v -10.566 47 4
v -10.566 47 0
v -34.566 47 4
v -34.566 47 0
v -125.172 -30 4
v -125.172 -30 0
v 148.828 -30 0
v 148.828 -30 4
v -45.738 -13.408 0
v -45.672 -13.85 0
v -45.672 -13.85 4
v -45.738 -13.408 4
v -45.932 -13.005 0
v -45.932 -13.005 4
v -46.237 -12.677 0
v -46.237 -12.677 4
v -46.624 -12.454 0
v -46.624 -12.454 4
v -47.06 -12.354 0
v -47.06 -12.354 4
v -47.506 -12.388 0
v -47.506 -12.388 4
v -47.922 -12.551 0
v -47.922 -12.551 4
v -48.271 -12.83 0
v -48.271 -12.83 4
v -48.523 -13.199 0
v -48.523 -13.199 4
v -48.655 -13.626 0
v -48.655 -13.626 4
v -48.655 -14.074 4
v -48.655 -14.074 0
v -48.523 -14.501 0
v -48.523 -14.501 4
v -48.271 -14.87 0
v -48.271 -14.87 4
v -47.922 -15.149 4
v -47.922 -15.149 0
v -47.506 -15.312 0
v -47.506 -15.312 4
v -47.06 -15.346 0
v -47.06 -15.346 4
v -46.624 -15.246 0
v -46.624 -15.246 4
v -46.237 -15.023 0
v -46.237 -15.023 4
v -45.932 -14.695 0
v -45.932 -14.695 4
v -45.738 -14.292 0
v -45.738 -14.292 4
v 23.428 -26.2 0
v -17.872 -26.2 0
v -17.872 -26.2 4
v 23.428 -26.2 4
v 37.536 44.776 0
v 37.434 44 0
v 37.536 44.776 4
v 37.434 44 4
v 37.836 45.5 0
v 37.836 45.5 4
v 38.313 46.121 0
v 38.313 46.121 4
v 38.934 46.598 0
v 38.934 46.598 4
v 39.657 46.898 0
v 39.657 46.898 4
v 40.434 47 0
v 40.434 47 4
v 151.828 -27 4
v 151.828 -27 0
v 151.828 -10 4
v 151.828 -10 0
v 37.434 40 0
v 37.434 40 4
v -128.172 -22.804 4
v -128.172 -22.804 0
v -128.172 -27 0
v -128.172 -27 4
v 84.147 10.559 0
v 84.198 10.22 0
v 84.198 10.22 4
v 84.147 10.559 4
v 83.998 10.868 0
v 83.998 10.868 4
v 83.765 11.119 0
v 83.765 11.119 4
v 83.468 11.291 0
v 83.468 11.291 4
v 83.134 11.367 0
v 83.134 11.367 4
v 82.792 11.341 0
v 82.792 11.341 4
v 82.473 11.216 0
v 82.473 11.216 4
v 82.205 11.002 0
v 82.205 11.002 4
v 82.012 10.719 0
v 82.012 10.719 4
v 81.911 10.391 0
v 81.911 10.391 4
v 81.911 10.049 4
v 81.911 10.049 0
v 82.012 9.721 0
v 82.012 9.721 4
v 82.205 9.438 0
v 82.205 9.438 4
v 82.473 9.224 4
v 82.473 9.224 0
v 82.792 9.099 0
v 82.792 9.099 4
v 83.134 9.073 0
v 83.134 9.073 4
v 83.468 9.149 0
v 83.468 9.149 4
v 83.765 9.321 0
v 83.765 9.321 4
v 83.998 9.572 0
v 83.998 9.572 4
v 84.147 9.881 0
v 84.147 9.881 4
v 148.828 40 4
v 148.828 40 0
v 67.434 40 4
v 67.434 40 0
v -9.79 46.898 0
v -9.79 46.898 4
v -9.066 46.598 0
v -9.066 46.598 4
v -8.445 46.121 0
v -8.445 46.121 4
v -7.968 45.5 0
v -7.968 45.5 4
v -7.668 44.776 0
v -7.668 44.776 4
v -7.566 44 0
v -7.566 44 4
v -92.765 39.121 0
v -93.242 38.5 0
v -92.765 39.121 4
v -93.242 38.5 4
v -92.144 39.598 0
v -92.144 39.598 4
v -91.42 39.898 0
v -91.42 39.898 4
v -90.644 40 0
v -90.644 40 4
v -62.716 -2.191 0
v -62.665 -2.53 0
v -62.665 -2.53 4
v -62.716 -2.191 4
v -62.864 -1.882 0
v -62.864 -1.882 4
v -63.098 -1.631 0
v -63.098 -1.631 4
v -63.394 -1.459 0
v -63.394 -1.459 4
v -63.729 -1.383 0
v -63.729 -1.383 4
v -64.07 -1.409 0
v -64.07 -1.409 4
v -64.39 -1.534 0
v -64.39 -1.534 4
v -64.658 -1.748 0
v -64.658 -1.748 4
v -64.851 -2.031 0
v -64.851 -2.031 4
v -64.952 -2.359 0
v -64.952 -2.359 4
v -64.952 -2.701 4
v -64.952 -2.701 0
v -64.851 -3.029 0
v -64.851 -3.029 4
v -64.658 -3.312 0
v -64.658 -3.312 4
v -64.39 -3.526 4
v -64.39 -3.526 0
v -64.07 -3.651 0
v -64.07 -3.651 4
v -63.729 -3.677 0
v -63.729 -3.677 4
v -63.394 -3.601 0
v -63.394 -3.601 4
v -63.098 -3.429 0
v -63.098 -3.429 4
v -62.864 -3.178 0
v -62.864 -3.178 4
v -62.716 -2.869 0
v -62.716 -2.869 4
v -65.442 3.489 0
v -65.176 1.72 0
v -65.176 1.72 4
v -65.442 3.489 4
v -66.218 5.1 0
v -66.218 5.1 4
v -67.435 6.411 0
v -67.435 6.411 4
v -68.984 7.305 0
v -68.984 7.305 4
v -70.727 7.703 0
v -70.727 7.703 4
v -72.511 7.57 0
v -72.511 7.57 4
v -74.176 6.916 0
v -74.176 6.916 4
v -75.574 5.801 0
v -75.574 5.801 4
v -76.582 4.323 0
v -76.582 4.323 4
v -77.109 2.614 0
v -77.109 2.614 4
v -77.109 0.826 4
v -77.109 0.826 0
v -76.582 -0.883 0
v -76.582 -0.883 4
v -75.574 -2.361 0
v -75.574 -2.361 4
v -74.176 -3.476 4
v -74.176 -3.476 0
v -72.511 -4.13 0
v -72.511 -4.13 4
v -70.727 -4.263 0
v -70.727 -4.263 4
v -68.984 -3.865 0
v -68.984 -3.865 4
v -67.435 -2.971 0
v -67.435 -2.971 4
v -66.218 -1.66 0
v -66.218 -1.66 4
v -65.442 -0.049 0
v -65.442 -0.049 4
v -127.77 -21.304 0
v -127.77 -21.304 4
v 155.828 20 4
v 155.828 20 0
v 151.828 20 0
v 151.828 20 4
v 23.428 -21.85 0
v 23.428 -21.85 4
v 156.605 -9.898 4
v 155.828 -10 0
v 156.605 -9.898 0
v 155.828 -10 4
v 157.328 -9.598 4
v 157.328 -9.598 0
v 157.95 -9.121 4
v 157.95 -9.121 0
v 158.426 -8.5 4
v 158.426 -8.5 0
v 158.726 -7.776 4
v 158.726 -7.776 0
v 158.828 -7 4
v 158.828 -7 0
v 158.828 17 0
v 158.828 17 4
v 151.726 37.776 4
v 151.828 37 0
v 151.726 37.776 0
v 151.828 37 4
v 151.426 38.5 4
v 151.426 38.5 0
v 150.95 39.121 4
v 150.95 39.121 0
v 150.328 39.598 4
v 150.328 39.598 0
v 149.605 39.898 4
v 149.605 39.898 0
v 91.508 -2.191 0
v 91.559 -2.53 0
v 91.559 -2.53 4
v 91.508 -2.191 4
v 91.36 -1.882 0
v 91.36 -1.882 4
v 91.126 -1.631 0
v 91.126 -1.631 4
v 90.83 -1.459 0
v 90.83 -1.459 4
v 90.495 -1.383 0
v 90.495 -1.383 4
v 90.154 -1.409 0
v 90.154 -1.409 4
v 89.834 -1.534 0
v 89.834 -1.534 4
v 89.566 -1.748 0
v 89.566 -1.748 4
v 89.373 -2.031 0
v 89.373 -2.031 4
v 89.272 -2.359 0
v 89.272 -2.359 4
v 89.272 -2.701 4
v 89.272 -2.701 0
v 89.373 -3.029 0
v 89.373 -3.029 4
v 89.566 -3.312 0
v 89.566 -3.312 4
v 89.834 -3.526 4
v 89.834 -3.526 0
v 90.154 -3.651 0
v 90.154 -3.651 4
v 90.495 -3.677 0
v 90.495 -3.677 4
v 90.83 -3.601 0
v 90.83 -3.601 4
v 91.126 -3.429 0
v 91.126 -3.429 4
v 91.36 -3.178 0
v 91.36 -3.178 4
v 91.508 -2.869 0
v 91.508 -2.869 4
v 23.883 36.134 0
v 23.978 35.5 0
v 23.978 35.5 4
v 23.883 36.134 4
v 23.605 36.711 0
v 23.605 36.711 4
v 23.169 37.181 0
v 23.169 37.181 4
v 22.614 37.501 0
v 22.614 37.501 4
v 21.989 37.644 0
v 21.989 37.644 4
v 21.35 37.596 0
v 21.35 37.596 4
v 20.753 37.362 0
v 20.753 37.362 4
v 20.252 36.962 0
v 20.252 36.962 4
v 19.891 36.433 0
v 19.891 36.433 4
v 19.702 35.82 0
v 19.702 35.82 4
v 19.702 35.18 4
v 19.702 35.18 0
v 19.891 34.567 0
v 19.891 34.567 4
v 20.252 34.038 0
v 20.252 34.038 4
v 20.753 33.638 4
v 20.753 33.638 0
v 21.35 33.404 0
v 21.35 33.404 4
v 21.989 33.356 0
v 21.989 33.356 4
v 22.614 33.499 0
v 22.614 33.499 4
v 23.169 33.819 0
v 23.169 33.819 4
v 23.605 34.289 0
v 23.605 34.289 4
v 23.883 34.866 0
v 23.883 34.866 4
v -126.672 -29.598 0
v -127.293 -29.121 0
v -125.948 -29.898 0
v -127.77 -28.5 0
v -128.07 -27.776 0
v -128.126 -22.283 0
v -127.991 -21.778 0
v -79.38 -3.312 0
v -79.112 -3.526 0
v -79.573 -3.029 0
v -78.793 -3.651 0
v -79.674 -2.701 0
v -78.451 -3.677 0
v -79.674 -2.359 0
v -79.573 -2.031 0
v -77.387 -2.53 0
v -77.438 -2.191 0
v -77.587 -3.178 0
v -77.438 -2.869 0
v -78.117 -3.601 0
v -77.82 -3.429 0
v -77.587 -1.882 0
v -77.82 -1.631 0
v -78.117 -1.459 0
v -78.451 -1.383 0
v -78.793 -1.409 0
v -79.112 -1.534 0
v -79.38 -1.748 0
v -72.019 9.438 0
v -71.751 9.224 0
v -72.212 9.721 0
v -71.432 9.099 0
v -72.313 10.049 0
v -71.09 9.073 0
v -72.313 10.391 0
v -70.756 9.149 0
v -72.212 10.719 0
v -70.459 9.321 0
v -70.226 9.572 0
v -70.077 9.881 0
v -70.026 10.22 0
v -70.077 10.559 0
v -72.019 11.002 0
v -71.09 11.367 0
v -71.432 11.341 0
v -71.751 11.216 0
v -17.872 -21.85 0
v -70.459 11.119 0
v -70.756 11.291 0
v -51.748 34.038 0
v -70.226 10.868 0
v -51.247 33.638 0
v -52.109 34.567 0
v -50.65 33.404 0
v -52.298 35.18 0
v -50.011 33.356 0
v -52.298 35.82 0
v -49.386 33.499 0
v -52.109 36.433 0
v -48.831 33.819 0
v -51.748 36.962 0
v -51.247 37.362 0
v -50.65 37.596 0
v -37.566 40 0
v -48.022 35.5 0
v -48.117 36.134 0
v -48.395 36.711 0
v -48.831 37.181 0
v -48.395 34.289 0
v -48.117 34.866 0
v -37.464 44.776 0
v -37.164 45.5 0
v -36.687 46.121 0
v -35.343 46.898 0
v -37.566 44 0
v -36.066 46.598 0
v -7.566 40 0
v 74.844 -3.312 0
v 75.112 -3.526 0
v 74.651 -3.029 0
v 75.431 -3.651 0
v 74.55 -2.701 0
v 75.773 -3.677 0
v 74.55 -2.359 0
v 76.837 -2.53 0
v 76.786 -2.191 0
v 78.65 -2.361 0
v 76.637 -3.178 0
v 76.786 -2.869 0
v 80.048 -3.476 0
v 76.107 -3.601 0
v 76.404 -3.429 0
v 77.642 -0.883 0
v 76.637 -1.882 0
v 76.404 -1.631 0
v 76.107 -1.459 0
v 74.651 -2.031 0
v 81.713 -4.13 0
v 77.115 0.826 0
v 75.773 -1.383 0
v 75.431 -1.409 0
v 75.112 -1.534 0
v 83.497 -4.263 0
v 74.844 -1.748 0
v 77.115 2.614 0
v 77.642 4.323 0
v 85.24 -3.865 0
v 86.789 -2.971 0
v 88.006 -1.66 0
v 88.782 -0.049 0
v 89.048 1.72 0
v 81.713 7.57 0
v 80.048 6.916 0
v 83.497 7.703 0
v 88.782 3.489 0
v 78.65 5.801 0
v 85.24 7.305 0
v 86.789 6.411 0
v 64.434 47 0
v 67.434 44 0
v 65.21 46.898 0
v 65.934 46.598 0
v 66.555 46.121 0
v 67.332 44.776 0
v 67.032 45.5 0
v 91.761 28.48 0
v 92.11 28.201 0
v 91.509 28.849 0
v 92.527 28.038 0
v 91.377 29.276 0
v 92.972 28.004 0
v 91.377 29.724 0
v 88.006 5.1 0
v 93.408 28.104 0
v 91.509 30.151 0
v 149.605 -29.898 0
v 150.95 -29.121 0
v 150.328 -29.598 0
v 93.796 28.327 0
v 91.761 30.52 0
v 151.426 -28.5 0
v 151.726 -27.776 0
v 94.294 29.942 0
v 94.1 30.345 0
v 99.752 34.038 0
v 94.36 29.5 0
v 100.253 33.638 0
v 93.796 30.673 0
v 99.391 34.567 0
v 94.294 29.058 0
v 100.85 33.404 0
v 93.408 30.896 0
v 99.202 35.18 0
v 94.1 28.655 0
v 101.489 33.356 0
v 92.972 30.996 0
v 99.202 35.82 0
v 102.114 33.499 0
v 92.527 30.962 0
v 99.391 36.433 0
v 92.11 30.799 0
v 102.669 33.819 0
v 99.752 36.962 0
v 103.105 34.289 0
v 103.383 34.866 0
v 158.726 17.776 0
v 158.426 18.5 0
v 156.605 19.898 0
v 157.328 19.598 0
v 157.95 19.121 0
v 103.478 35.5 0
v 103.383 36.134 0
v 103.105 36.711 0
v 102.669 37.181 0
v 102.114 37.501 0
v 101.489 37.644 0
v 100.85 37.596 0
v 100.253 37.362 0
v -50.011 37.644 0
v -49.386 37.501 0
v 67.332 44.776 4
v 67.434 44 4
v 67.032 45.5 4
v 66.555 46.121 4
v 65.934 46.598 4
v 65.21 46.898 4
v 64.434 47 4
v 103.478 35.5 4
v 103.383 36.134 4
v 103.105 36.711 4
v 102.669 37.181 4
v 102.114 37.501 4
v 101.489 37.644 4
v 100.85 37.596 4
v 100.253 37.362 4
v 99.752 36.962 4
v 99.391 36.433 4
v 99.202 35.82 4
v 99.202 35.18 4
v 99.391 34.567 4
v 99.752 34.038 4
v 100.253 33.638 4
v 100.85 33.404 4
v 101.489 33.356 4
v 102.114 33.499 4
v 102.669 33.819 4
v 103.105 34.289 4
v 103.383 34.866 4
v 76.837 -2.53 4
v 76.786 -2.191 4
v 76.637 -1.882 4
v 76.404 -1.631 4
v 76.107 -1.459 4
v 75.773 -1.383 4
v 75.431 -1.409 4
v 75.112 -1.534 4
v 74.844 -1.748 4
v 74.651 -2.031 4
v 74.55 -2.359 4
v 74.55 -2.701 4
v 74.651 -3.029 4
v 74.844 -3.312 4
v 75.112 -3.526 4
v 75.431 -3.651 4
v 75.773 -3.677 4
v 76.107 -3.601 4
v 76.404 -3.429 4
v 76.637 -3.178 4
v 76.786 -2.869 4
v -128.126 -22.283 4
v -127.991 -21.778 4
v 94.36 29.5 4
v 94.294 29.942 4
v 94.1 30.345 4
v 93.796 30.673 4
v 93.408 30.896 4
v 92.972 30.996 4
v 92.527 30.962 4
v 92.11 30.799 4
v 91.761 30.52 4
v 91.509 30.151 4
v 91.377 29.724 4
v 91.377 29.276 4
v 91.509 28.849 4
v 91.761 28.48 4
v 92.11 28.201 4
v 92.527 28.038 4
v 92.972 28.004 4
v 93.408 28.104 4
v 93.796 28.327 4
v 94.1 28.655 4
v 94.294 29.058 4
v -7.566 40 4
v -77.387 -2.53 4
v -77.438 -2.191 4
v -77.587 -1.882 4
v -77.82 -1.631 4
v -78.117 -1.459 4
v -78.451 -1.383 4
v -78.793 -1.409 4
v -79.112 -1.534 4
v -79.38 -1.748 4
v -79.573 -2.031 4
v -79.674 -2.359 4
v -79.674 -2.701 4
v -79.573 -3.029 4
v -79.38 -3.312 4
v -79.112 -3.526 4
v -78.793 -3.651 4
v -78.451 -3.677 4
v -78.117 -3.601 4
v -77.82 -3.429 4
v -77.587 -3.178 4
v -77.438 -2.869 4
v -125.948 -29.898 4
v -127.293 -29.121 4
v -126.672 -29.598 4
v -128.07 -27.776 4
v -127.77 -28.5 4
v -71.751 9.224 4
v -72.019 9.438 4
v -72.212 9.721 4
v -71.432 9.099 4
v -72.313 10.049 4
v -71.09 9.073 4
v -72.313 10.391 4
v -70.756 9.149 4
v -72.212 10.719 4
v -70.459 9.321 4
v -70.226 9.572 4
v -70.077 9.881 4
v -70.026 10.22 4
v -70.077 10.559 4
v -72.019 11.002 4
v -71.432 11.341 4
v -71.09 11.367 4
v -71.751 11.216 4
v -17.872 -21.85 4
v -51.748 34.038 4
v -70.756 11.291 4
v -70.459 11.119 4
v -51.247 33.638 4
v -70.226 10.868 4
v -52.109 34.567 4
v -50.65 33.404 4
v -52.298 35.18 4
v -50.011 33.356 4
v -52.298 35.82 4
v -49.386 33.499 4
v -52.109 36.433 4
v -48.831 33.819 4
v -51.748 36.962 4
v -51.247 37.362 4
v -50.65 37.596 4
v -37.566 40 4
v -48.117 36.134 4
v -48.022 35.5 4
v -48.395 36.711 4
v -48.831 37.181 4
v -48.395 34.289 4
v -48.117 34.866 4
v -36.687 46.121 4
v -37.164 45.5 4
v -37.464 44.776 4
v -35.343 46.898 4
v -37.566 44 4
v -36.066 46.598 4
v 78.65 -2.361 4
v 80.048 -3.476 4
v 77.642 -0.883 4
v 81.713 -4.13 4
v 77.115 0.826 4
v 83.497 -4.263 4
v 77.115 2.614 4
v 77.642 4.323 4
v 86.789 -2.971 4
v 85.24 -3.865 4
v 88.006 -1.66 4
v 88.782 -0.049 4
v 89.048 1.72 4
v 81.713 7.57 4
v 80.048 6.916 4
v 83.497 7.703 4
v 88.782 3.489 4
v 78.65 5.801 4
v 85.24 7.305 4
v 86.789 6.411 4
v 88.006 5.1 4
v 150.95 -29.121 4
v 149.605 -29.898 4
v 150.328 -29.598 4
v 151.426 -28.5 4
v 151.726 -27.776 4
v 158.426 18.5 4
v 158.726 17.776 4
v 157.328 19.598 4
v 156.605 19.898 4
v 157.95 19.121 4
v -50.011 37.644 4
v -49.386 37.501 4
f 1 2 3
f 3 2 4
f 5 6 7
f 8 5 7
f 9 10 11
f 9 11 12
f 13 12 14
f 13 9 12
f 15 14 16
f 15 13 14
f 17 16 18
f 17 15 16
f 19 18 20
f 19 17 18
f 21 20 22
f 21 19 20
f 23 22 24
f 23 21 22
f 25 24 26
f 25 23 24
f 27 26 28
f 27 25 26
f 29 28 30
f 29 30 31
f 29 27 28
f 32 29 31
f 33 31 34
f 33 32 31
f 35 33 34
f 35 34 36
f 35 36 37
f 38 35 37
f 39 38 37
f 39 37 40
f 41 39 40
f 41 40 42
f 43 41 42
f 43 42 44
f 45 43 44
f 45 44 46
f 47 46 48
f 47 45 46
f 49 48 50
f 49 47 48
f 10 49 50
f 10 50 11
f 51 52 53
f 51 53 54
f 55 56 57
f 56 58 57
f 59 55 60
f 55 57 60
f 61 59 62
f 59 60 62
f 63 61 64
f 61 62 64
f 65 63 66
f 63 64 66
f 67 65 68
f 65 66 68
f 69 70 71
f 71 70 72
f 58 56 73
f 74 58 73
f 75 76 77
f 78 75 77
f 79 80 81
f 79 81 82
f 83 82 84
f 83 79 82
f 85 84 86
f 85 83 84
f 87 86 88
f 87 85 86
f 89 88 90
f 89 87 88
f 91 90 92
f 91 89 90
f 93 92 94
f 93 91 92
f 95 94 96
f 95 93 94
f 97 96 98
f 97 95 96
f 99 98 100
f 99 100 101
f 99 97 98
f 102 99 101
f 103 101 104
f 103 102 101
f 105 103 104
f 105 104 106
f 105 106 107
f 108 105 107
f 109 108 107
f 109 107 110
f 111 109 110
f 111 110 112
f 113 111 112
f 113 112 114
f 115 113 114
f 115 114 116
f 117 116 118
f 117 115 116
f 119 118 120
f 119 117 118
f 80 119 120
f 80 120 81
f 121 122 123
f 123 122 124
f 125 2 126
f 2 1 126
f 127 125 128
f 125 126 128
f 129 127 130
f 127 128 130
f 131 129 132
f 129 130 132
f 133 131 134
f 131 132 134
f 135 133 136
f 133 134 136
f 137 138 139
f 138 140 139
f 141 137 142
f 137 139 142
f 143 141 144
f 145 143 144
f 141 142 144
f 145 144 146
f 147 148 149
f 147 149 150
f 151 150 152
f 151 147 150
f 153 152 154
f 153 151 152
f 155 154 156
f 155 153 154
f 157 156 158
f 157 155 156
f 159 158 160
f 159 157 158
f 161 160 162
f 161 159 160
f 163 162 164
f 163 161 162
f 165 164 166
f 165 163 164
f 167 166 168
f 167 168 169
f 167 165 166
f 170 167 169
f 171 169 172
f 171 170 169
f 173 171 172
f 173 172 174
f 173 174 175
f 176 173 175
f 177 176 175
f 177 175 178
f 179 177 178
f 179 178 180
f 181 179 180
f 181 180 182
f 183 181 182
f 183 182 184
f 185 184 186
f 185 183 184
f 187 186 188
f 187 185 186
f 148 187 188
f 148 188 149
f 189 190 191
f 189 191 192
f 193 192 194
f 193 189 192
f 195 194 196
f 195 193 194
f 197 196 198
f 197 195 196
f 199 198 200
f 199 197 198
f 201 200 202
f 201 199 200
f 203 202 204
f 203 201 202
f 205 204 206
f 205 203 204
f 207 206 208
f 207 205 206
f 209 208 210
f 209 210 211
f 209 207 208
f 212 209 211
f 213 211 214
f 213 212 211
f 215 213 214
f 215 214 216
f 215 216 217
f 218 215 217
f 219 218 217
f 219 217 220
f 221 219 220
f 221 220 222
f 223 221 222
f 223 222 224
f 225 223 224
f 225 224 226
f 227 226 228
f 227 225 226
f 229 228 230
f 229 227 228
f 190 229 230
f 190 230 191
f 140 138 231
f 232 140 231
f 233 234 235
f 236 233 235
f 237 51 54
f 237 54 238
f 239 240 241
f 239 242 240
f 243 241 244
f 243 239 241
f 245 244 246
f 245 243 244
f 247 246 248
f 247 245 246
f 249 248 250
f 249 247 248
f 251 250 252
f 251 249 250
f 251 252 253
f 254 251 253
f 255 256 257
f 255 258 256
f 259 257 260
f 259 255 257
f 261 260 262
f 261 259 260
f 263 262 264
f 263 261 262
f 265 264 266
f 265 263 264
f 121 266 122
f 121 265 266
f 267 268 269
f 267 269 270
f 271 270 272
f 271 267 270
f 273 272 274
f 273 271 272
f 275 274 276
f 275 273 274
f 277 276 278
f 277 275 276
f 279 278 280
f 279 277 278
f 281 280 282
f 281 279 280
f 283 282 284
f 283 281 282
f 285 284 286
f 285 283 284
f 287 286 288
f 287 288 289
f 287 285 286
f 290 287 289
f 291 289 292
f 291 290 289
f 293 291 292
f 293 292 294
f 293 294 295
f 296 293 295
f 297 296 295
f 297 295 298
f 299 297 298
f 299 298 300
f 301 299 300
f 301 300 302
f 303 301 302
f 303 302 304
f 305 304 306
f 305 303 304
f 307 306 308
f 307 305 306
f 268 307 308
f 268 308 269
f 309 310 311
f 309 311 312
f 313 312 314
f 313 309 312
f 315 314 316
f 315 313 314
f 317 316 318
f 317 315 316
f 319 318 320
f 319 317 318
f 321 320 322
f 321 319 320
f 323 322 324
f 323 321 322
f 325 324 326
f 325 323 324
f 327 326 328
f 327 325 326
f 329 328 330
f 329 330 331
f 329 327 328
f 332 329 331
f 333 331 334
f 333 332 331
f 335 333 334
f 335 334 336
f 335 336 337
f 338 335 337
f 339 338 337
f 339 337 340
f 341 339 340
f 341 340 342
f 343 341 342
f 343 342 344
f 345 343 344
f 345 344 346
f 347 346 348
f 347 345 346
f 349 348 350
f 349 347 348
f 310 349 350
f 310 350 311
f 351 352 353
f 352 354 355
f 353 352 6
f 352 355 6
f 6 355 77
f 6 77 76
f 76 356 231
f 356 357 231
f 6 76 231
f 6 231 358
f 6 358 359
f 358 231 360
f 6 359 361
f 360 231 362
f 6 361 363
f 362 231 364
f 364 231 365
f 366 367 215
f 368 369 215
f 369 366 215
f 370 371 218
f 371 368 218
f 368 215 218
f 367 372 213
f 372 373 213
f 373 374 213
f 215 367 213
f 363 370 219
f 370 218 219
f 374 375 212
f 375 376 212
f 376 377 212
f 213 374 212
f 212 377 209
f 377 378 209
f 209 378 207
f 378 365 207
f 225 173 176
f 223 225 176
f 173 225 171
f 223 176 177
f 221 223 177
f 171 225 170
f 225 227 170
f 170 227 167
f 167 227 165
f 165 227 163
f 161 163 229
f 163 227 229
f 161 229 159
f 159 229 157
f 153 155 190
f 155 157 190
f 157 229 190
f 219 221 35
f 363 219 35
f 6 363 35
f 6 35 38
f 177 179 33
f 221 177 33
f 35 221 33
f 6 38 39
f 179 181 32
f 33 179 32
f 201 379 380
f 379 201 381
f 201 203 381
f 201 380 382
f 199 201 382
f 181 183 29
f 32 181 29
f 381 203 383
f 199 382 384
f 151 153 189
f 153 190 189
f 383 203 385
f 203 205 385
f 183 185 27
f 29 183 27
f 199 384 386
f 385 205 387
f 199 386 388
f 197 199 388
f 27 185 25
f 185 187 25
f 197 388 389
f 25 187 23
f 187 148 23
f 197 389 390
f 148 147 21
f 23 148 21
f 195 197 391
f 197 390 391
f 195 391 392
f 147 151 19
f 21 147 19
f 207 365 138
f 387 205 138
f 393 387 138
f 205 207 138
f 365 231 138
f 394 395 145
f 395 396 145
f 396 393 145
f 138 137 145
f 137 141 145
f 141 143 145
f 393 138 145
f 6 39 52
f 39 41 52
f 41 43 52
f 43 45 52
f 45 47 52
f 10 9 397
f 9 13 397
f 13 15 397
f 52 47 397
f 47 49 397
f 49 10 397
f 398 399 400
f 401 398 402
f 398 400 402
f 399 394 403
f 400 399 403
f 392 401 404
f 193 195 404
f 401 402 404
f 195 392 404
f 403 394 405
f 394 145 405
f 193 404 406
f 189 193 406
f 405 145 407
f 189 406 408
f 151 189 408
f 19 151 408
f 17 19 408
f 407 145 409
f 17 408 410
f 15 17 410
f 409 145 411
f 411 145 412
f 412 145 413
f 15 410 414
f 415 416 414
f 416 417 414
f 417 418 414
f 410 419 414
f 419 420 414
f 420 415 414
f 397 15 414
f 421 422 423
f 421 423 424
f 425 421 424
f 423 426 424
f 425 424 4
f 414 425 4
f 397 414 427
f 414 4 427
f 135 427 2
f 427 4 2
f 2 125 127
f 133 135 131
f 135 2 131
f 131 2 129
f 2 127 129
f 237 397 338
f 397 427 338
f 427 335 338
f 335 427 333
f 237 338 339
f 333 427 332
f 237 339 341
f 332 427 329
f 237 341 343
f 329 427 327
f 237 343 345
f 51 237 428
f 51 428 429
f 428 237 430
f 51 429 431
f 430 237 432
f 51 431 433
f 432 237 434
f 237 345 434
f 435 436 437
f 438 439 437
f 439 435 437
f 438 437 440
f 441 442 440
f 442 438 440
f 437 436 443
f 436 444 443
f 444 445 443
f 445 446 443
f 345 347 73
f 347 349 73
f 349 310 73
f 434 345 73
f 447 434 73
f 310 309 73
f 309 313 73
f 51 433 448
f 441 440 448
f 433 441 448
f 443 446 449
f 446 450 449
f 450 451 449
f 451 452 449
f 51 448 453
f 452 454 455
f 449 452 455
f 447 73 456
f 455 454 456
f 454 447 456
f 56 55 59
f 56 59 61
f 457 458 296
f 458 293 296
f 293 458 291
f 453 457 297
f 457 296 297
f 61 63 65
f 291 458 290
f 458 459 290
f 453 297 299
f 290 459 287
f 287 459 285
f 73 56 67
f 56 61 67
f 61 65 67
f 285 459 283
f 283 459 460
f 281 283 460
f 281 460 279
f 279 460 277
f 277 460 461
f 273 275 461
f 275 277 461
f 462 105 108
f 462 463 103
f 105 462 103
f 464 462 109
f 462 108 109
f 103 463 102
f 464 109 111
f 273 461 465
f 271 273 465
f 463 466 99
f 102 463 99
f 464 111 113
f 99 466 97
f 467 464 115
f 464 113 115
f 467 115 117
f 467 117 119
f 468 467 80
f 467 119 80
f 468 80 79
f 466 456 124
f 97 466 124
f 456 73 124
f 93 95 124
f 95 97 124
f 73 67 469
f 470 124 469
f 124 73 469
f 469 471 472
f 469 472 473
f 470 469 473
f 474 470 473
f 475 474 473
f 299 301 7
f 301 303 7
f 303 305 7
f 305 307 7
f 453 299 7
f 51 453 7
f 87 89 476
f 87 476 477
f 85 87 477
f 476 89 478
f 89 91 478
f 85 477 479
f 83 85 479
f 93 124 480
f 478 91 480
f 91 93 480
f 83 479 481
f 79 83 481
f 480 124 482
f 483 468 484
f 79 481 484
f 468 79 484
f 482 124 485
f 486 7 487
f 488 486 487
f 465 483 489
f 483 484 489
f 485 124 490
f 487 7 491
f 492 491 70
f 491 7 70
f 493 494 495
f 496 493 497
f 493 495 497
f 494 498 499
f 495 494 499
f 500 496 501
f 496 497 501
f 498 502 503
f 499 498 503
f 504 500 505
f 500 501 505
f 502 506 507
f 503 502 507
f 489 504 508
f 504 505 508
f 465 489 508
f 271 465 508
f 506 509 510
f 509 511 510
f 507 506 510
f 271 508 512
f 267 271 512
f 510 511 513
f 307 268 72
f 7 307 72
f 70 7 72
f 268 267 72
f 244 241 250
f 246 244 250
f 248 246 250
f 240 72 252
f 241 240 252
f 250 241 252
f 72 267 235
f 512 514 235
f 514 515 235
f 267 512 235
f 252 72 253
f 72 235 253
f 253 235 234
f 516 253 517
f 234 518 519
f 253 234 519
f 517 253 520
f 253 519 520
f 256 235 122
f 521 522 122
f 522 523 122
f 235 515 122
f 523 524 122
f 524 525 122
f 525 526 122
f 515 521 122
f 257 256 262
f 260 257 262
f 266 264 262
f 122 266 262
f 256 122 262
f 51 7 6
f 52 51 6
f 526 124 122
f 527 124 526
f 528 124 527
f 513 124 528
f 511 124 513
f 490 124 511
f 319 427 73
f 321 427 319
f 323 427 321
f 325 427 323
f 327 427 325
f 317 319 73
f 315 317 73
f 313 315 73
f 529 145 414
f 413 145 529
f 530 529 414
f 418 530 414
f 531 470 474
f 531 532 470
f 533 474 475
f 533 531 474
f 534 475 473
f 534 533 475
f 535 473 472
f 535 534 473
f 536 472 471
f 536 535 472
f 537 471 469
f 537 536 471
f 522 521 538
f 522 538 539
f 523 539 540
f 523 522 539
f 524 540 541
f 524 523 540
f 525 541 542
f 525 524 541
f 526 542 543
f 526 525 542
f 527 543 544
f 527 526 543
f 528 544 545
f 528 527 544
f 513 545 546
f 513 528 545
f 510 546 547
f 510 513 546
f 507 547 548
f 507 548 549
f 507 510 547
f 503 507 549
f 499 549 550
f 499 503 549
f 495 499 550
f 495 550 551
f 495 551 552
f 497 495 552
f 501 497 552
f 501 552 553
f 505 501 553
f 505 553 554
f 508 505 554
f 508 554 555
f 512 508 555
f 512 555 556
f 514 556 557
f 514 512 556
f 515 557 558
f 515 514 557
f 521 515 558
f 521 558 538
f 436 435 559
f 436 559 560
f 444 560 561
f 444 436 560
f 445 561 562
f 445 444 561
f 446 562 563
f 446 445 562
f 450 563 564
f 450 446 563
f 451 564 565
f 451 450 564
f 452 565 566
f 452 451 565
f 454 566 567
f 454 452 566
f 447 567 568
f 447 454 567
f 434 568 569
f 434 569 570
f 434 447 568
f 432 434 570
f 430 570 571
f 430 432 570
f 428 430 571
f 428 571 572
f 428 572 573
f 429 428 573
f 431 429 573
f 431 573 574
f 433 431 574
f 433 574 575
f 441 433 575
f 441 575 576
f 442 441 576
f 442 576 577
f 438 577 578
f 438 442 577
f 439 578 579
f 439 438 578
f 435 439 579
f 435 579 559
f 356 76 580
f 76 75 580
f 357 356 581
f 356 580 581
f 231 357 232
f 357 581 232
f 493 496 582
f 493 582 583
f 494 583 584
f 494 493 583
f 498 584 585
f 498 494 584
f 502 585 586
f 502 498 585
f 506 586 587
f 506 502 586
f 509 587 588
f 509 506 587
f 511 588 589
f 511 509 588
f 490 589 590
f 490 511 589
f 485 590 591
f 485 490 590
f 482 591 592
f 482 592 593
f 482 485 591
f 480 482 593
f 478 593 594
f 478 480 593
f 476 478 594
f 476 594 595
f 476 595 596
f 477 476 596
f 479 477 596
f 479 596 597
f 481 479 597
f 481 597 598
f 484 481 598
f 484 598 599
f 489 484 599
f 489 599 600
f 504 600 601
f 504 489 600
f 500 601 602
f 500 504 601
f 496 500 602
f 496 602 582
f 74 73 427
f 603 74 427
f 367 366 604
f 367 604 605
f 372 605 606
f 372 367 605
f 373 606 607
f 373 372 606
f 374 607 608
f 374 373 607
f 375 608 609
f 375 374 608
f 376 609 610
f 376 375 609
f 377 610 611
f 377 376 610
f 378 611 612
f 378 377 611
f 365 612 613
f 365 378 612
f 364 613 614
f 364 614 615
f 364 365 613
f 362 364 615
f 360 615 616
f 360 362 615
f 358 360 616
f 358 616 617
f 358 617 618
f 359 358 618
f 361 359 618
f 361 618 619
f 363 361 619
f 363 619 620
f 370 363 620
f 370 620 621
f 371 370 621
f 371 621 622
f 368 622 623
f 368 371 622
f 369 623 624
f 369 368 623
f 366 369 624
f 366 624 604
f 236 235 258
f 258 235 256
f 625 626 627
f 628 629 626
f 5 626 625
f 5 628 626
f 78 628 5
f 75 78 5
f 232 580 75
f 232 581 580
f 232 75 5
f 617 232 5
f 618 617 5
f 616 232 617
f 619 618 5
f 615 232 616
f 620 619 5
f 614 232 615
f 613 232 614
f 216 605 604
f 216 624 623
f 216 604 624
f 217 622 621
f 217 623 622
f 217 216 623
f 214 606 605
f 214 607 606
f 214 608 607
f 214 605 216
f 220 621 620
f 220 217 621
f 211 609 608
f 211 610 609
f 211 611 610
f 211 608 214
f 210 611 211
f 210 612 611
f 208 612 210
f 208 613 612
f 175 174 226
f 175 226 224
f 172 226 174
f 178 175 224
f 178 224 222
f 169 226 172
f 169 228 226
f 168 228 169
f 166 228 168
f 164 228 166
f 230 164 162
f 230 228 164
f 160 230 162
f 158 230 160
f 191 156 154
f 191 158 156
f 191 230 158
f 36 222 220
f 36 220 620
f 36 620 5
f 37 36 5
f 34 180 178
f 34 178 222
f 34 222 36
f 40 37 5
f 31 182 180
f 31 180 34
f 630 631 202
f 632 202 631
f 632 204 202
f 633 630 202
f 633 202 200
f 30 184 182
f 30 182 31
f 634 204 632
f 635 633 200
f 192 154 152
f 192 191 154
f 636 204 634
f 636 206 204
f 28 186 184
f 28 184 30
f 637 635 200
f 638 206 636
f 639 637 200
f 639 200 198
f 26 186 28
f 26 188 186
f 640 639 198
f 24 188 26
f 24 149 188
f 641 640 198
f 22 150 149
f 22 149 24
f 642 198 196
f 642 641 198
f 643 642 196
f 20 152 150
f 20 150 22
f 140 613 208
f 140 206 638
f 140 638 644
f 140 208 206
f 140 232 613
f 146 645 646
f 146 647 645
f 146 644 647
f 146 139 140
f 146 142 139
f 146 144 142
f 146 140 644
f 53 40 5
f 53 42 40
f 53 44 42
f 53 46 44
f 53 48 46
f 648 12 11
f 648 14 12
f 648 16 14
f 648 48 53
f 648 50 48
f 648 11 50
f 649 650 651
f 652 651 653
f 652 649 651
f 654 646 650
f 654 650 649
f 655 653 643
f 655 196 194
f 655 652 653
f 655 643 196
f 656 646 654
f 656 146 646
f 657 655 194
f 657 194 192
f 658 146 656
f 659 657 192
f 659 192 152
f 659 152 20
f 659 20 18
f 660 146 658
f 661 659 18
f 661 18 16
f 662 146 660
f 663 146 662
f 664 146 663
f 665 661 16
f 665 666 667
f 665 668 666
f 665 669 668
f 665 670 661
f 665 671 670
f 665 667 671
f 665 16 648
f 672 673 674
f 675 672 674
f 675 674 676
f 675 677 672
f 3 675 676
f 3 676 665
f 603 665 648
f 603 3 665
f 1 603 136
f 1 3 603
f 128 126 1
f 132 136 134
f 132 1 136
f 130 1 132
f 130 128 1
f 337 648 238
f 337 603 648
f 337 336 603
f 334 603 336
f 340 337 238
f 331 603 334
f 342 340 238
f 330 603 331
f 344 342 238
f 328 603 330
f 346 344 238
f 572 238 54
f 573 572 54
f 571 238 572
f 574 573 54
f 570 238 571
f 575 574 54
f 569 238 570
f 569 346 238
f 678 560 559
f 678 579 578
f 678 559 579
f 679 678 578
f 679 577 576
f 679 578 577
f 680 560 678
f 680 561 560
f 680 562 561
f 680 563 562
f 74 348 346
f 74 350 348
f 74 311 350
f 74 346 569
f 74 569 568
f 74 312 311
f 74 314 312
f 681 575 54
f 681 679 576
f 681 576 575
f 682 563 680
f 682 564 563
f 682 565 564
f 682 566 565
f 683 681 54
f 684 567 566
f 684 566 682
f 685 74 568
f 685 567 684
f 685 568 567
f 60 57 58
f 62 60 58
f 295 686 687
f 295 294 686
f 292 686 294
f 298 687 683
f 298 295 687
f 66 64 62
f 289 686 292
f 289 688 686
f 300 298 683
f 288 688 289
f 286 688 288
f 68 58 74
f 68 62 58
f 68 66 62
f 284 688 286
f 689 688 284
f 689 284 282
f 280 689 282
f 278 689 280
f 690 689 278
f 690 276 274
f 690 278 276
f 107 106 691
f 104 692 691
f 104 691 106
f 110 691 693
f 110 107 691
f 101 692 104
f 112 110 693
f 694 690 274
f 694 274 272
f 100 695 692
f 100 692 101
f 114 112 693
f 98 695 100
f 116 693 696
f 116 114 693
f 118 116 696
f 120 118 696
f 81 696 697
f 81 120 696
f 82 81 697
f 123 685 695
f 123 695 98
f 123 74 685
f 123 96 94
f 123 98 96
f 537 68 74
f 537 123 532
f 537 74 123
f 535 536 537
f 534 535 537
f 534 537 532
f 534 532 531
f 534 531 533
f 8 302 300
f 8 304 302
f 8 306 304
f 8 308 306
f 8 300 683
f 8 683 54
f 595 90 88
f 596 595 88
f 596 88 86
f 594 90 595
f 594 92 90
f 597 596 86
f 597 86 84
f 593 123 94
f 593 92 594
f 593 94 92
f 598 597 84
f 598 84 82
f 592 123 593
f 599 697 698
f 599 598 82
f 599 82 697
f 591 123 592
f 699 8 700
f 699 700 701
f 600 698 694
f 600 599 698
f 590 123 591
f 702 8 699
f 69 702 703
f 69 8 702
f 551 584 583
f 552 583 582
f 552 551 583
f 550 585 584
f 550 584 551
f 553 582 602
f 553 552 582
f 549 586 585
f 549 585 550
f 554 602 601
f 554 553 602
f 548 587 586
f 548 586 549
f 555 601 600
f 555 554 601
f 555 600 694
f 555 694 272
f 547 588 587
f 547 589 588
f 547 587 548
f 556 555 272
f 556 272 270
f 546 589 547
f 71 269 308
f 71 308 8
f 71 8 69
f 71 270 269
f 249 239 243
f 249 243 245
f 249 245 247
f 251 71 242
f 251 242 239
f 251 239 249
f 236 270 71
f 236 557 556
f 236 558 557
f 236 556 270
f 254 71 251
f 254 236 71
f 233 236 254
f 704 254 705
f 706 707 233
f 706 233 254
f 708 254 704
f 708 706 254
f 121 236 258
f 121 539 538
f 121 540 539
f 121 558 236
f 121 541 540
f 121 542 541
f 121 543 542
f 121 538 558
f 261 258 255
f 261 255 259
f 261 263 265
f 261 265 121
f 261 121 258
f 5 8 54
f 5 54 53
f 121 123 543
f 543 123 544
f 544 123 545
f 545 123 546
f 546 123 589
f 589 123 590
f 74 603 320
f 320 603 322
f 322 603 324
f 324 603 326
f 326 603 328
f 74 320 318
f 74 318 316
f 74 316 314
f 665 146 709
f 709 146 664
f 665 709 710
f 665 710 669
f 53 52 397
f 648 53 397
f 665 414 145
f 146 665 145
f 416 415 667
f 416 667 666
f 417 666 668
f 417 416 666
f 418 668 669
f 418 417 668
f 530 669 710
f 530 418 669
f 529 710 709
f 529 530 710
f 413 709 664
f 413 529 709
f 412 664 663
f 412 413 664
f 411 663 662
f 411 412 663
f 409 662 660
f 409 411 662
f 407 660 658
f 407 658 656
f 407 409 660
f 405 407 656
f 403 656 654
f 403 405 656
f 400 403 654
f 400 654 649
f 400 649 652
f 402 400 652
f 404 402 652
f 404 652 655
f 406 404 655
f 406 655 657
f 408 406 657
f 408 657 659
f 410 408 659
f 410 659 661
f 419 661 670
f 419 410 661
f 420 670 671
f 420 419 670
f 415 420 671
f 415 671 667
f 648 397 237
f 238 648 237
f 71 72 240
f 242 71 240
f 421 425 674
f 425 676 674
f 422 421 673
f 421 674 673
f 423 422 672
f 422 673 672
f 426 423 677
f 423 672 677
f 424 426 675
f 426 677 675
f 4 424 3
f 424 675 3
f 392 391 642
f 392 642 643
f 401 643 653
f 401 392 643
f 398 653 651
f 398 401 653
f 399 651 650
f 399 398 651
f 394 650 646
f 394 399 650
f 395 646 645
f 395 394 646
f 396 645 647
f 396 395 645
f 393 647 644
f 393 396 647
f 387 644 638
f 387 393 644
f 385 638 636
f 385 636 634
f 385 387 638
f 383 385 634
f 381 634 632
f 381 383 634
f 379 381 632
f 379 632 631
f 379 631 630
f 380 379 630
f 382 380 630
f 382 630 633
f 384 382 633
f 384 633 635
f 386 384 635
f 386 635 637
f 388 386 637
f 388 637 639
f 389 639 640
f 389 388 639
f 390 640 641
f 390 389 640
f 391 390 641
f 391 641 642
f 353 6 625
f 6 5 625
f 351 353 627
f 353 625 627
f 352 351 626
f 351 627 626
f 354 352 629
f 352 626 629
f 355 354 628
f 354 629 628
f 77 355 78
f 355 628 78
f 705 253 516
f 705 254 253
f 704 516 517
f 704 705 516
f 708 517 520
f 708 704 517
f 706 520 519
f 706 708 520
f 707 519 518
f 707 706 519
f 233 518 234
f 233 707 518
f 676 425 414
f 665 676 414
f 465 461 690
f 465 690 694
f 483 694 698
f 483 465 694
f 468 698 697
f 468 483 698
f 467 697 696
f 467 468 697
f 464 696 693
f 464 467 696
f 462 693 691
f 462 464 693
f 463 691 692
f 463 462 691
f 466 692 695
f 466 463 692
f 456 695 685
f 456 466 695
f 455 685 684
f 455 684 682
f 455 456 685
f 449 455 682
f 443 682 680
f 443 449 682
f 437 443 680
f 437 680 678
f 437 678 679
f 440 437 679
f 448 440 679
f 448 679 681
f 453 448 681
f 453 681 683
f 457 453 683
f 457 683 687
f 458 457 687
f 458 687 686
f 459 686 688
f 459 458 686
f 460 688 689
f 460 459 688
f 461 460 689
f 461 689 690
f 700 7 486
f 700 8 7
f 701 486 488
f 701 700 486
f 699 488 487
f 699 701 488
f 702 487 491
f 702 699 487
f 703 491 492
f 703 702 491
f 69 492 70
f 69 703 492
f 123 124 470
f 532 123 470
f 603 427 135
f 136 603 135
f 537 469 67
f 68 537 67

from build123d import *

# Parameters (mm, degrees)
SKETCH1_R           = 6
SKETCH1_R_2         = 1.15
SKETCH1_R_3         = 1.5
SKETCH1_R_4         = 2.15
SKETCH1_W           = 41.3
SKETCH1_H           = 4.35
BOSS_EXTRUDE1_DEPTH = 4
FILLET1_R           = 3


with BuildPart() as part:
    # Sketch1 → Boss-Extrude1 (new body)
    with BuildSketch(Plane.XY):
        Polygon((-128.17175976, -30), (151.82824024, -30), (151.82824024, -10), (158.82824024, -10), (158.82824024, 5), (158.82824024, 20), (151.82824024, 20), (151.82824024, 40), (67.43395693, 40), (67.43395693, 47), (37.43395693, 47), (37.43395693, 40), (-7.56604307, 40), (-7.56604307, 47), (-37.56604307, 47), (-37.56604307, 40), (-92.37604307, 40), (-128.17175976, -22), align=None)
        with Locations((-71.175741186, 1.72)):
            Circle(SKETCH1_R, mode=Mode.SUBTRACT)
        with Locations((-71.175741186, 10.22)):
            Circle(SKETCH1_R_2, mode=Mode.SUBTRACT)
        with Locations((-63.814525254, -2.53)):
            Circle(SKETCH1_R_2, mode=Mode.SUBTRACT)
        with Locations((-78.536957118, -2.53)):
            Circle(SKETCH1_R_2, mode=Mode.SUBTRACT)
        with Locations((83.04824024, 1.72)):
            Circle(SKETCH1_R, mode=Mode.SUBTRACT)
        with Locations((83.04824024, 10.22)):
            Circle(SKETCH1_R_2, mode=Mode.SUBTRACT)
        with Locations((90.409456172, -2.53)):
            Circle(SKETCH1_R_2, mode=Mode.SUBTRACT)
        with Locations((75.687024308, -2.53)):
            Circle(SKETCH1_R_2, mode=Mode.SUBTRACT)
        with Locations((92.86036, 29.5)):
            Circle(SKETCH1_R_3, mode=Mode.SUBTRACT)
        with Locations((-50.17175976, 35.5)):
            Circle(SKETCH1_R_4, mode=Mode.SUBTRACT)
        with Locations((21.82824024, 35.5)):
            Circle(SKETCH1_R_4, mode=Mode.SUBTRACT)
        with Locations((101.32824024, 35.5)):
            Circle(SKETCH1_R_4, mode=Mode.SUBTRACT)
        with Locations((-47.17175976, -13.85)):
            Circle(SKETCH1_R_3, mode=Mode.SUBTRACT)
        with Locations((2.77824024, -24.025)):
            Rectangle(SKETCH1_W, SKETCH1_H, mode=Mode.SUBTRACT)
    extrude(amount=BOSS_EXTRUDE1_DEPTH)

    # Fillet1
    fillet1_edges = [part.edges().sort_by_distance(p)[0] for p in [
        (-128.17175976, -22, 2),
        (-92.37604307, 40, 2),
        (-37.56604307, 47, 2),
        (-7.56604307, 47, 2),
        (37.43395693, 47, 2),
        (67.43395693, 47, 2),
        (151.82824024, 40, 2),
        (158.82824024, 20, 2),
        (158.82824024, -10, 2),
        (151.82824024, -30, 2),
        (-128.17175976, -30, 2),
    ]]
    fillet(fillet1_edges, radius=FILLET1_R)


solid = part.part
